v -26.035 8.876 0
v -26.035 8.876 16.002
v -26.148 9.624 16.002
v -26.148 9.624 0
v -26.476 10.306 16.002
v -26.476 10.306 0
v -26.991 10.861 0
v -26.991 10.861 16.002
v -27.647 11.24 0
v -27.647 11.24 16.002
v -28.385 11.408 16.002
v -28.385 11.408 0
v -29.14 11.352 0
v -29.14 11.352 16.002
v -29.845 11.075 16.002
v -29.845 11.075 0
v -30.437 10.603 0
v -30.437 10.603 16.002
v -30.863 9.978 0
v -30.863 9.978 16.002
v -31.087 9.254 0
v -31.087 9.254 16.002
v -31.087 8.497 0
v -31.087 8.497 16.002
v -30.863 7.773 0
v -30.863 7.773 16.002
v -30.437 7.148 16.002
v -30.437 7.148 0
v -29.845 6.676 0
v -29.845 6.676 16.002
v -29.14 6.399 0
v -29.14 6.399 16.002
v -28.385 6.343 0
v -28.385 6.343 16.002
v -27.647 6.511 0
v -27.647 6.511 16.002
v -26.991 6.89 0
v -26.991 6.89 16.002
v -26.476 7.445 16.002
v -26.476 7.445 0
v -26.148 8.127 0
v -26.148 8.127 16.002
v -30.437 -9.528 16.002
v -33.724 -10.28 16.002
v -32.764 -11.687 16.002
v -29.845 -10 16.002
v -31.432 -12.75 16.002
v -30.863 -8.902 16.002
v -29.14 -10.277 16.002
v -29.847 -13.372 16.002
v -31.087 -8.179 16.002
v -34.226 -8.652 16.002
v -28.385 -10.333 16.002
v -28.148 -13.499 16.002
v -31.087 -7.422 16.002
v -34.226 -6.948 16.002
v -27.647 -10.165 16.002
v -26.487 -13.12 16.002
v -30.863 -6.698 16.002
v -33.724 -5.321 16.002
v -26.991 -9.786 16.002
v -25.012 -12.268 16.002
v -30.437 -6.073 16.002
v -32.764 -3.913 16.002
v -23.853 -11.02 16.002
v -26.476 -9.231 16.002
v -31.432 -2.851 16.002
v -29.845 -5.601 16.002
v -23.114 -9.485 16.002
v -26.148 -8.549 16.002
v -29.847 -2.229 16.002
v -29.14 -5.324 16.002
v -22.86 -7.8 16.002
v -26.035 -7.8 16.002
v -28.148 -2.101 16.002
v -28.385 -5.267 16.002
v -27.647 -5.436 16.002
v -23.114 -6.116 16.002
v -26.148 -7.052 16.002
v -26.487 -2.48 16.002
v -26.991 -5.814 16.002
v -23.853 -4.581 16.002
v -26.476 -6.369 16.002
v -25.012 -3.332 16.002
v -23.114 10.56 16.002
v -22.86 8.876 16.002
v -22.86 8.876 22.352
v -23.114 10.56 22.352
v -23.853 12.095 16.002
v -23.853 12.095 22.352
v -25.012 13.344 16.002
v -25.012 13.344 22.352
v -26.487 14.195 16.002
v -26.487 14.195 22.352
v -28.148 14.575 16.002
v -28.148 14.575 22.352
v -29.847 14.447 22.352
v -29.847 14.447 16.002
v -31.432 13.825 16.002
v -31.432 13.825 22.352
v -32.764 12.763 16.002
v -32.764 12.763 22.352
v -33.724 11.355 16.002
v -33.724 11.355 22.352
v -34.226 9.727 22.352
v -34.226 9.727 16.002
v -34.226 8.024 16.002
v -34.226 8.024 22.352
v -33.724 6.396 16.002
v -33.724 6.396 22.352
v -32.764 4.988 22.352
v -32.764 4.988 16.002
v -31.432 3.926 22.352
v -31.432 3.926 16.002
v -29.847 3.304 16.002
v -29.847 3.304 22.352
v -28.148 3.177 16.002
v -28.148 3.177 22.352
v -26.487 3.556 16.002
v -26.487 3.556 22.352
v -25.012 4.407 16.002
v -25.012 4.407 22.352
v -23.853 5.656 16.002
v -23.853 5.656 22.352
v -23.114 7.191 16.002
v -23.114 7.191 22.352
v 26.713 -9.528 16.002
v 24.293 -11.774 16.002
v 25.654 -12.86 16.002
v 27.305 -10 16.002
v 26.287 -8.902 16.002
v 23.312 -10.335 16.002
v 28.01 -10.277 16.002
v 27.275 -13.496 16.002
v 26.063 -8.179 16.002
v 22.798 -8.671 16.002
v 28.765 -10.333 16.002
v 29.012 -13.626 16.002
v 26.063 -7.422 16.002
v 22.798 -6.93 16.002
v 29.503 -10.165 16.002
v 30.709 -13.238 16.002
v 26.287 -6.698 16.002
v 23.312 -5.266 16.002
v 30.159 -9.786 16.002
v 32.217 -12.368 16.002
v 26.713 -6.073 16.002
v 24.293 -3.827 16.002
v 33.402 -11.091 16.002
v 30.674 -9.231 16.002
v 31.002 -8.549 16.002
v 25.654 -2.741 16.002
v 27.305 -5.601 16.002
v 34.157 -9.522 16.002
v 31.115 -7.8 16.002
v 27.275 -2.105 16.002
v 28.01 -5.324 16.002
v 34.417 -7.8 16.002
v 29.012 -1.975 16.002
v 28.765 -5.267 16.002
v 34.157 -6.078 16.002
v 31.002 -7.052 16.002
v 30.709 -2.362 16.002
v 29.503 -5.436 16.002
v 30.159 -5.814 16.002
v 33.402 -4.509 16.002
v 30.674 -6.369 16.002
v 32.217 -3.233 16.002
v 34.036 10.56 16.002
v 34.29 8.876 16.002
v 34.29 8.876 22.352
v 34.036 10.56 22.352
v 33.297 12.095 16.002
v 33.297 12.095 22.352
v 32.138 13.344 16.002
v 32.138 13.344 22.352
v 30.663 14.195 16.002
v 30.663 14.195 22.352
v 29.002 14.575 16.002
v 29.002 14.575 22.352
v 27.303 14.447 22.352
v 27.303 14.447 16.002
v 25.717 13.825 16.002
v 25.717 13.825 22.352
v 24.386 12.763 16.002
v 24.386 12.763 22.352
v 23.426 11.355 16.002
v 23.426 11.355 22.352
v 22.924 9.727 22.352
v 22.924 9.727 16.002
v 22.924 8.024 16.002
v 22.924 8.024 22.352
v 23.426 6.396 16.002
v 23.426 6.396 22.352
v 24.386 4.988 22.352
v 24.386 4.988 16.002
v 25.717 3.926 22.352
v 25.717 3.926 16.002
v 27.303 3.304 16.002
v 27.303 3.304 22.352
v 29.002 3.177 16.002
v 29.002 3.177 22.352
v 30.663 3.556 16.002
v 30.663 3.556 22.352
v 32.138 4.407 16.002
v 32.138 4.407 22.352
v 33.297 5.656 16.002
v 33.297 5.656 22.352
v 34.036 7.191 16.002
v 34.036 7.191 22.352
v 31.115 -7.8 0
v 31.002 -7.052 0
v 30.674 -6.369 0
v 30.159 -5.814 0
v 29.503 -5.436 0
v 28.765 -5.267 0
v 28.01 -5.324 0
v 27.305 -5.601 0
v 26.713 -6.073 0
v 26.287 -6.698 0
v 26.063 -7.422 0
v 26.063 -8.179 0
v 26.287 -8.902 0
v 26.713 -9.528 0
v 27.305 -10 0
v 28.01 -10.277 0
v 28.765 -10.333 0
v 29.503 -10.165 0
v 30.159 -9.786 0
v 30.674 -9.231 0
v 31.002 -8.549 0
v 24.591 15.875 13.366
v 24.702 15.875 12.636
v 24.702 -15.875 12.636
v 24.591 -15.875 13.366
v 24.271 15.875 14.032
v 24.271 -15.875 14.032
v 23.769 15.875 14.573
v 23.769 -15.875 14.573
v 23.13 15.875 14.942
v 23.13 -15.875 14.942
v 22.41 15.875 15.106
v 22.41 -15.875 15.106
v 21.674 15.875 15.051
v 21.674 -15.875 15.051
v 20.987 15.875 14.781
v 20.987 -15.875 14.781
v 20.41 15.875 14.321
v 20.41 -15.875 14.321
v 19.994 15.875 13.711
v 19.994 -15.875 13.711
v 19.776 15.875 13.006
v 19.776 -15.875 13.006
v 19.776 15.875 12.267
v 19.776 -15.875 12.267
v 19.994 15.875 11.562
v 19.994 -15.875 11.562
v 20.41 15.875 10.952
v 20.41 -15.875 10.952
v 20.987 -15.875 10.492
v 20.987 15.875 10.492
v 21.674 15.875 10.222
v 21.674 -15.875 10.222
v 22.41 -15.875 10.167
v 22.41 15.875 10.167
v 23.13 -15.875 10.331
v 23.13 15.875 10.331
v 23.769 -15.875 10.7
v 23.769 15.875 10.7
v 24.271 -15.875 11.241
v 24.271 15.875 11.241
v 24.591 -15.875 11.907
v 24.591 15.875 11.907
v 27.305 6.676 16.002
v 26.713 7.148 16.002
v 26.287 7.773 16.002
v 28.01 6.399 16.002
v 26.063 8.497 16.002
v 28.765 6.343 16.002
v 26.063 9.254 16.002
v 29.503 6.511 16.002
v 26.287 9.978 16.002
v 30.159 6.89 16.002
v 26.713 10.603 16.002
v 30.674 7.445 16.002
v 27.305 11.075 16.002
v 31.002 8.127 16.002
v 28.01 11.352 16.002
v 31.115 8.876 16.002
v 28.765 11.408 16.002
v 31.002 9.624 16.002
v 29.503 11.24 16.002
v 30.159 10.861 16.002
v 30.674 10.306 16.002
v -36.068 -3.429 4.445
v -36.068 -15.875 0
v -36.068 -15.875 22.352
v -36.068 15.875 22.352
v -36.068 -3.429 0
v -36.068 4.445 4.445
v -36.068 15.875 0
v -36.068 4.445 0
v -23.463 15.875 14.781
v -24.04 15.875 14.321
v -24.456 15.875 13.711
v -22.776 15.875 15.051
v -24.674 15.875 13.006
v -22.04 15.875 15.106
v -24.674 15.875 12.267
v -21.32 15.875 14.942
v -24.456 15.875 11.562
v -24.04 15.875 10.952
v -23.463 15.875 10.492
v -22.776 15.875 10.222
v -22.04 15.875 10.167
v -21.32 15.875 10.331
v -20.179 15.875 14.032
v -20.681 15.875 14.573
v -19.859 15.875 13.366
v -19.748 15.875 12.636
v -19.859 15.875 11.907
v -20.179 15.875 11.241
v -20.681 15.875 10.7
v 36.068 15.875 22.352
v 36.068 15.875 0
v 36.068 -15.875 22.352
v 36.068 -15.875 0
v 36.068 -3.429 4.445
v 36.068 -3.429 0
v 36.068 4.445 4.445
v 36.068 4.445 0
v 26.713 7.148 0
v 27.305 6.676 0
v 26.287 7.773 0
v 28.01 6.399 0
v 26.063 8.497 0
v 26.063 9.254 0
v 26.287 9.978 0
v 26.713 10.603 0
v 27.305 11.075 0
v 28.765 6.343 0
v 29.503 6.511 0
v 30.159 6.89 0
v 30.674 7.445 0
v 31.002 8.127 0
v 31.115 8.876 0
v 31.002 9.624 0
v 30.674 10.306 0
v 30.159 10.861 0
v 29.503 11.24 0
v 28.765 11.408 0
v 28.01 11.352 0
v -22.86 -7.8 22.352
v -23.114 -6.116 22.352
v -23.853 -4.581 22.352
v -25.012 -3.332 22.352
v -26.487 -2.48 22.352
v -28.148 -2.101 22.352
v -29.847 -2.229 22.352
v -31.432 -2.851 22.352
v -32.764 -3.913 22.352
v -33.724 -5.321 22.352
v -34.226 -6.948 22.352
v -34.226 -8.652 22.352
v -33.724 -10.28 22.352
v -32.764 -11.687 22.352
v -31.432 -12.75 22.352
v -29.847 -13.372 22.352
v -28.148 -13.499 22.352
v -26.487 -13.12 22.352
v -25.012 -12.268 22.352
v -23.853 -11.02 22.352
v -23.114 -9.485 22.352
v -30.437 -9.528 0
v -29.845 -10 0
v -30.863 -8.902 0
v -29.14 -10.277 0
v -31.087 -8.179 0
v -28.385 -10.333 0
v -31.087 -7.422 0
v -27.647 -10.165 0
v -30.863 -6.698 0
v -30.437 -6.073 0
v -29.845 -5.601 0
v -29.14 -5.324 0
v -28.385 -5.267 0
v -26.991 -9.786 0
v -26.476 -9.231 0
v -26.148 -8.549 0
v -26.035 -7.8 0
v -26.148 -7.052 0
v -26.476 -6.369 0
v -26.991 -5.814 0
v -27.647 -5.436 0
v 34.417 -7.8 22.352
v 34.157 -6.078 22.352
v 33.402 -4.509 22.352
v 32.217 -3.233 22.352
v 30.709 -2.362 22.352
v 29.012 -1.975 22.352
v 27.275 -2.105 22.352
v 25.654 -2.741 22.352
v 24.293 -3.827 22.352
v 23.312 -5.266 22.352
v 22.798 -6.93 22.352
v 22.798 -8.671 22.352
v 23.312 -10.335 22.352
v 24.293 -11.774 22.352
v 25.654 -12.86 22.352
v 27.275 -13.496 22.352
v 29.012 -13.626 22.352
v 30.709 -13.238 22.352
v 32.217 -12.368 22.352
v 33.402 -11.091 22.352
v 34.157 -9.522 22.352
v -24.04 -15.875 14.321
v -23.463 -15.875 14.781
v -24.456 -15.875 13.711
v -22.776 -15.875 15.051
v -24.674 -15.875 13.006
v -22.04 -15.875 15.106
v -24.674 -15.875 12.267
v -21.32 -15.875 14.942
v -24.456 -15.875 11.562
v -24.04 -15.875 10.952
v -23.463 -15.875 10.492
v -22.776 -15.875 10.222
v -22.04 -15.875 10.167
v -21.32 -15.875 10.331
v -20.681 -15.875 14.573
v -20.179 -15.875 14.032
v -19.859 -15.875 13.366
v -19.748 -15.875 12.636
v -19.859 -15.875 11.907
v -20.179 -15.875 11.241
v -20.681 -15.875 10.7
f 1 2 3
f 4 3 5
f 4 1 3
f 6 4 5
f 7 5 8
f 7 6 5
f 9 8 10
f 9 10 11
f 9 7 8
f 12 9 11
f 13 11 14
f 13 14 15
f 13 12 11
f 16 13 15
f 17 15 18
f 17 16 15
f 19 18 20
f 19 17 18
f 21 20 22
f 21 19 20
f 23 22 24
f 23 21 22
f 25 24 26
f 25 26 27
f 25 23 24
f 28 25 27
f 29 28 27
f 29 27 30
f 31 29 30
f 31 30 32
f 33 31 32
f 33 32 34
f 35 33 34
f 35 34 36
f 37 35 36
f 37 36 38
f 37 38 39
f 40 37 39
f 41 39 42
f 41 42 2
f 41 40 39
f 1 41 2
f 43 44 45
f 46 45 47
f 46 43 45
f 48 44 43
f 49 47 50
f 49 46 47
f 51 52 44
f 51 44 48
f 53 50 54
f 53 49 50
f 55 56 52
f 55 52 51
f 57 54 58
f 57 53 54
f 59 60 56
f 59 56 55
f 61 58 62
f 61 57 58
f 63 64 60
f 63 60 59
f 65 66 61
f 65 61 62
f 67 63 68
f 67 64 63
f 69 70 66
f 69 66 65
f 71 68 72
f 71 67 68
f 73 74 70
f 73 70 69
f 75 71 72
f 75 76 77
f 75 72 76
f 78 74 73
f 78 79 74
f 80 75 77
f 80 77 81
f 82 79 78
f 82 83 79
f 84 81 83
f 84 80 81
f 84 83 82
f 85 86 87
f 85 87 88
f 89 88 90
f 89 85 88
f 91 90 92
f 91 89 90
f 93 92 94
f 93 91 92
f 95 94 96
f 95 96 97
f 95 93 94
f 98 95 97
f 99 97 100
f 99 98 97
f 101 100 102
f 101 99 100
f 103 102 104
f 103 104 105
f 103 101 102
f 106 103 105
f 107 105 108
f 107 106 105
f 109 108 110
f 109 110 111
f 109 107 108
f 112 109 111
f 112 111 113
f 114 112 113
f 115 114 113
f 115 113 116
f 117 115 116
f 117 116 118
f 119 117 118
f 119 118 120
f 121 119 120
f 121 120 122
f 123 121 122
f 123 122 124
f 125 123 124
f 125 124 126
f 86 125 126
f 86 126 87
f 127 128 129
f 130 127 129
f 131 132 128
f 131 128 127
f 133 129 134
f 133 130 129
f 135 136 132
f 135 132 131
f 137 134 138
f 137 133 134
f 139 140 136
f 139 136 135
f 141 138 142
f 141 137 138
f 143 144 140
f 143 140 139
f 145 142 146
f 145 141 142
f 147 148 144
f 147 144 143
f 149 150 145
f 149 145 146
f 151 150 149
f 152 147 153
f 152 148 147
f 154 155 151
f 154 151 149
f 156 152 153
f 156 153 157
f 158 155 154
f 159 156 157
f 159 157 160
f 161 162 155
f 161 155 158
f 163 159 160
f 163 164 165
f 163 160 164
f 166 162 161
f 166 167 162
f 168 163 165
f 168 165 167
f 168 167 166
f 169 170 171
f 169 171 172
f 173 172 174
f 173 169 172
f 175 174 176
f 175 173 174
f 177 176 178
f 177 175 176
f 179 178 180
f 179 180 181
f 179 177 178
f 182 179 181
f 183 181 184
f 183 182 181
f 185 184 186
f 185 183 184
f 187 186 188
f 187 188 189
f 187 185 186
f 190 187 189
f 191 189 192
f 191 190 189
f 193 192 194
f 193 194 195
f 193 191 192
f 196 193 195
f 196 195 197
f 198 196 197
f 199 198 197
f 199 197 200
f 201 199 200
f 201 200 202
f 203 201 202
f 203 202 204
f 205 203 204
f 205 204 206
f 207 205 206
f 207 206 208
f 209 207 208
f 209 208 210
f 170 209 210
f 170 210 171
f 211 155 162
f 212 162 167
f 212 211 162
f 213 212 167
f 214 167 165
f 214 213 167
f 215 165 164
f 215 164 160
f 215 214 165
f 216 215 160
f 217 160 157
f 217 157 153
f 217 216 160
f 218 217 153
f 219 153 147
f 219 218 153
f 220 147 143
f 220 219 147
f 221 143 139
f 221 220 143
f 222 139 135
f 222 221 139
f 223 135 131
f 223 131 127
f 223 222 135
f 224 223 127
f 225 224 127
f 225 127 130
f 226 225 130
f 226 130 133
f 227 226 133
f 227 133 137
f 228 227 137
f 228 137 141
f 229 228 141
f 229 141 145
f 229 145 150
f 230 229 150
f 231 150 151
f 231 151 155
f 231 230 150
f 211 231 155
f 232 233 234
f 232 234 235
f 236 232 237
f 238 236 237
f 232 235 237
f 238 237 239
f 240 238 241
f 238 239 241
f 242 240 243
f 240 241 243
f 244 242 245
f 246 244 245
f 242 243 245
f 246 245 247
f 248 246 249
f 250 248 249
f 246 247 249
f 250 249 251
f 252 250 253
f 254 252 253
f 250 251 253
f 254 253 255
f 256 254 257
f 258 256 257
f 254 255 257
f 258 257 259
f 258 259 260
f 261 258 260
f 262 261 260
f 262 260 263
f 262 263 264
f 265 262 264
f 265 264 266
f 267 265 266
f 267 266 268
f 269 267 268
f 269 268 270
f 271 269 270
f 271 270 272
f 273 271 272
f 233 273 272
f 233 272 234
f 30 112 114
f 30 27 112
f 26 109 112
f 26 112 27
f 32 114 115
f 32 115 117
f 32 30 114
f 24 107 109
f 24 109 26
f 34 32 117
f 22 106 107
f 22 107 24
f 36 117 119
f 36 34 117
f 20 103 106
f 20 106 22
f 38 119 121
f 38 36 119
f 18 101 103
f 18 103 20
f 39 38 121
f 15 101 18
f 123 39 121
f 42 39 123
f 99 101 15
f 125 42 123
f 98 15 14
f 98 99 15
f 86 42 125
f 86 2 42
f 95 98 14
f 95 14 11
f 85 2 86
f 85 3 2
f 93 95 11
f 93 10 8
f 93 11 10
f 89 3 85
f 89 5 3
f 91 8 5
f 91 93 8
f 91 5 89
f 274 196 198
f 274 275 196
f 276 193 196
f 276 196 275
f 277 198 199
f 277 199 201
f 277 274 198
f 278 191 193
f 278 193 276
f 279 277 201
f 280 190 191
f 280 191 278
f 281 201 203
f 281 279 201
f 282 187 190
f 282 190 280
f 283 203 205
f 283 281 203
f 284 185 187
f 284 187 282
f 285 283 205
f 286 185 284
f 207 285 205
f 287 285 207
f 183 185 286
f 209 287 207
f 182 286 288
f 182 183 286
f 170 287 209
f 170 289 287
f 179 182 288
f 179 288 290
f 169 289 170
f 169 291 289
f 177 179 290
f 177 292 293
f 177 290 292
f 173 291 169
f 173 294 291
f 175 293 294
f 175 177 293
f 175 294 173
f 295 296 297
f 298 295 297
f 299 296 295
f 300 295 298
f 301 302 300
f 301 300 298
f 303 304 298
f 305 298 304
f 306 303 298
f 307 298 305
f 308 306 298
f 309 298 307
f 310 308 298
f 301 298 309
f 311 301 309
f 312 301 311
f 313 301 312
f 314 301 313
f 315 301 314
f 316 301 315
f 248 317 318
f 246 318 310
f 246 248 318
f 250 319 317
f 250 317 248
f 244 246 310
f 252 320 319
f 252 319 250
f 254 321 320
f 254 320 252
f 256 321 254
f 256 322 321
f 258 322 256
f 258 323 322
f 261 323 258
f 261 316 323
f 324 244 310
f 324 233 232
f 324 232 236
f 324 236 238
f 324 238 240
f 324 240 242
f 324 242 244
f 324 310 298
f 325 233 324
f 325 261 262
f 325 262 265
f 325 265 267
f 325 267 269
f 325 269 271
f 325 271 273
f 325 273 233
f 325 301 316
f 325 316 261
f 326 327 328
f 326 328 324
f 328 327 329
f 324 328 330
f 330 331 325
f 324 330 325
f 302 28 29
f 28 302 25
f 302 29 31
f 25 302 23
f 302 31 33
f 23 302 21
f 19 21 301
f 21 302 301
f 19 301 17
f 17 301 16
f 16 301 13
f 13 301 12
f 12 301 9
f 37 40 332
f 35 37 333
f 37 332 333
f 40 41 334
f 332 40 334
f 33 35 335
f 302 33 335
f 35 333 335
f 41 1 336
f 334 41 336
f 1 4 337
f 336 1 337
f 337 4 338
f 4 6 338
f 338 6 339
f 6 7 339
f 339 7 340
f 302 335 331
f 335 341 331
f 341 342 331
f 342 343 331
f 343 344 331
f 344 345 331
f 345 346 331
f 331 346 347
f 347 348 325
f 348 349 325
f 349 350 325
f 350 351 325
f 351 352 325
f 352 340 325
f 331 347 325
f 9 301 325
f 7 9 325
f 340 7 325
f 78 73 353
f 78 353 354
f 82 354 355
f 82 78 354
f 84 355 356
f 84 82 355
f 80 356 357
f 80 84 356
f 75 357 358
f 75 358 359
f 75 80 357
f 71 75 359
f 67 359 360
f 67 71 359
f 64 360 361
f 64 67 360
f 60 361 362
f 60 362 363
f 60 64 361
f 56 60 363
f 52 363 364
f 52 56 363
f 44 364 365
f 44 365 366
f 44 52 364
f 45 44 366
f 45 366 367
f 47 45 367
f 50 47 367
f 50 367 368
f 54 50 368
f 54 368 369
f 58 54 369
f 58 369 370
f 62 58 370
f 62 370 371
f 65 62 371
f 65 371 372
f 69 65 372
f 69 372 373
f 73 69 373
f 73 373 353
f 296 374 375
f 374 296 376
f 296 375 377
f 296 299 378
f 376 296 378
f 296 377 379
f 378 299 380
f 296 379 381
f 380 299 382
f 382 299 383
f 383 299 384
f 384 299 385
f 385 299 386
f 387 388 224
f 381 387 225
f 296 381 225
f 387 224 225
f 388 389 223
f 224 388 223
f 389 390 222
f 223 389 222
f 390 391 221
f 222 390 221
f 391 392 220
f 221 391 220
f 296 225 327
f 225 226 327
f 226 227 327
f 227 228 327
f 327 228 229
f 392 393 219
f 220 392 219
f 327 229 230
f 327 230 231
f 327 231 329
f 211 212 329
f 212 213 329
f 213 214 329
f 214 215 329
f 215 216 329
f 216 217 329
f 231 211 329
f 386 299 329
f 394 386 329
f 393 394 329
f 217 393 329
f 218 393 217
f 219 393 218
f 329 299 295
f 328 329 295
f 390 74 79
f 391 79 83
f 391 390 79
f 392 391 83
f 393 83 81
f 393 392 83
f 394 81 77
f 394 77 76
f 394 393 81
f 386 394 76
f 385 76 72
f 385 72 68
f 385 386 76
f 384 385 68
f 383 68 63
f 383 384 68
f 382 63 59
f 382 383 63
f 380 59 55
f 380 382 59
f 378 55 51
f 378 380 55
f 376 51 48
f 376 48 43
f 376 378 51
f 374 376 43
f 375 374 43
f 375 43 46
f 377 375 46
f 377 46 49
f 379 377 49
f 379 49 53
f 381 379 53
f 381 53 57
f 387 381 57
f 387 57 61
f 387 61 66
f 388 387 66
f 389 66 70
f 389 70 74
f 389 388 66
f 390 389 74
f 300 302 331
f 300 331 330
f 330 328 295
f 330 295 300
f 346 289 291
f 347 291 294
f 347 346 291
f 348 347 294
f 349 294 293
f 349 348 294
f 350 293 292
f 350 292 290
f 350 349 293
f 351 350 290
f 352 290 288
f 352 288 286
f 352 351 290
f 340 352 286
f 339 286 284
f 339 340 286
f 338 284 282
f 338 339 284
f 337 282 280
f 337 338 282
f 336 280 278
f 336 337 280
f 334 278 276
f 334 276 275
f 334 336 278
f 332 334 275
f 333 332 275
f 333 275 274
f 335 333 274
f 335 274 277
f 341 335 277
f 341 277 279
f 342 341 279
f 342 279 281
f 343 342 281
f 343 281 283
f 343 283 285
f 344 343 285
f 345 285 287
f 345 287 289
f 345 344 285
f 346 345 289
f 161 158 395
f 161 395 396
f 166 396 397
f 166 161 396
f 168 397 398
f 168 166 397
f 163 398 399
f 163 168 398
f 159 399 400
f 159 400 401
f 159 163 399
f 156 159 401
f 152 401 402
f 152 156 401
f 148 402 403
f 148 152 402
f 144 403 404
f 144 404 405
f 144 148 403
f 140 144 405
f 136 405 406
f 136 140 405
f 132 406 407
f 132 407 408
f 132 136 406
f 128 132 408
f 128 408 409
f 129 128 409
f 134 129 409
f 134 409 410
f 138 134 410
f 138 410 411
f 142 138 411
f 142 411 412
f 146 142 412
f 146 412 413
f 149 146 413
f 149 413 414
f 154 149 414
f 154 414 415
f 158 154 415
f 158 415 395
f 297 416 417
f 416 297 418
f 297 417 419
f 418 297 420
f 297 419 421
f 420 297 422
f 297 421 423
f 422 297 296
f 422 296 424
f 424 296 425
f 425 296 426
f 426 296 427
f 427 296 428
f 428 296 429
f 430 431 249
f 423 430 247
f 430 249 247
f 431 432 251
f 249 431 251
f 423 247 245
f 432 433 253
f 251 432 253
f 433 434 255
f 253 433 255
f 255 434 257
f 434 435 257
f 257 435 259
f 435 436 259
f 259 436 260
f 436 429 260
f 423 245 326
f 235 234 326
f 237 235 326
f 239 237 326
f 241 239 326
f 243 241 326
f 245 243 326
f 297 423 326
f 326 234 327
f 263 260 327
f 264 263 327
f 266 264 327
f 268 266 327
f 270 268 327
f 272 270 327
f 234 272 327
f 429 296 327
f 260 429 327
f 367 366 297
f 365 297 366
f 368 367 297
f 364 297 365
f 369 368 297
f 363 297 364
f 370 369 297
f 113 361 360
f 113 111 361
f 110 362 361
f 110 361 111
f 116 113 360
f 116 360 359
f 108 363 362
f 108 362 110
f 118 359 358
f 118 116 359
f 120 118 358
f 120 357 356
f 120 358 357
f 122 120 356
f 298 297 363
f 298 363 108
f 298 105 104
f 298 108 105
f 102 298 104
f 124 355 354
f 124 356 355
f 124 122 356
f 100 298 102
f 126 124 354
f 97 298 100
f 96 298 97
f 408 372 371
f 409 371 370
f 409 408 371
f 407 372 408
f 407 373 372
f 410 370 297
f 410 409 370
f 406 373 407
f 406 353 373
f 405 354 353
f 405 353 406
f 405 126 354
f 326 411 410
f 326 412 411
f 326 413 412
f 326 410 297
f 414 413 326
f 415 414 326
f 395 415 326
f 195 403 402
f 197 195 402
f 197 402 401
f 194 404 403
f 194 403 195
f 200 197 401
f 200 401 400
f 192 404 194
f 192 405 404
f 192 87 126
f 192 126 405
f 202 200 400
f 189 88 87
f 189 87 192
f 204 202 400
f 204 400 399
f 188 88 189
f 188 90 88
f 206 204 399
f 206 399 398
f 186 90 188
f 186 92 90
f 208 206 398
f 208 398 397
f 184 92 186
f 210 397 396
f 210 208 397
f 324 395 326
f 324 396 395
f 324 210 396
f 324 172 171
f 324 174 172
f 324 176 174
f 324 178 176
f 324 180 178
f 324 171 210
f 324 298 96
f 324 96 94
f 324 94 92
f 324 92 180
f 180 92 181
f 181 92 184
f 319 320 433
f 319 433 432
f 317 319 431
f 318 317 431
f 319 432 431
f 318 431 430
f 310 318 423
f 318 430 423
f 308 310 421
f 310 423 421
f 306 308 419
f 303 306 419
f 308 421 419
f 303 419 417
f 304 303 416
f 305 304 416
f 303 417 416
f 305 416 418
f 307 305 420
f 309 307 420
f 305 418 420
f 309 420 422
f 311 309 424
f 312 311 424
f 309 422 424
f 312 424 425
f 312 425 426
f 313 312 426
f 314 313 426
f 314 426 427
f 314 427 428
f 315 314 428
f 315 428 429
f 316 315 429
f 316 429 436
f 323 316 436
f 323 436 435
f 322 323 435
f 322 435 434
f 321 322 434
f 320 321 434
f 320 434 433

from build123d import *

# Parameters (mm, degrees)
SKETCH1_W           = 72.136
SKETCH1_H           = 31.75
SKETCH1_R           = 5.715
SKETCH1_R_2         = 5.842
BOSS_EXTRUDE1_DEPTH = 22.352
SKETCH4_R           = 5.715
SKETCH4_R_2         = 2.54
SKETCH4_R_3         = 5.842
BOSS_EXTRUDE2_DEPTH = 16.002
SKETCH2_R           = 2.4765
CUT_EXTRUDE1_DEPTH  = 32.75
SKETCH5_W           = 4.445
SKETCH5_H           = 7.874
CUT_EXTRUDE2_DEPTH  = 73.136


with BuildPart() as part:
    # Sketch1 → Boss-Extrude1 (new body)
    with BuildSketch(Plane.XY):
        Rectangle(SKETCH1_W, SKETCH1_H)
        with Locations((-28.575, 8.875537672)):
            Circle(SKETCH1_R, mode=Mode.SUBTRACT)
        with Locations((28.575, 8.875537672)):
            Circle(SKETCH1_R, mode=Mode.SUBTRACT)
        with Locations((-28.575, -7.8002595)):
            Circle(SKETCH1_R, mode=Mode.SUBTRACT)
        with Locations((28.575, -7.8002595)):
            Circle(SKETCH1_R_2, mode=Mode.SUBTRACT)
    extrude(amount=BOSS_EXTRUDE1_DEPTH)

    # Sketch4 → Boss-Extrude2 (add)
    with BuildSketch(Plane.XY):
        with Locations((-28.575, 8.875537672)):
            Circle(SKETCH4_R)
        with Locations((-28.575, 8.875537672)):
            Circle(SKETCH4_R_2, mode=Mode.SUBTRACT)
        with Locations((-28.575, -7.8002595)):
            Circle(SKETCH4_R)
        with Locations((-28.575, -7.8002595)):
            Circle(SKETCH4_R_2, mode=Mode.SUBTRACT)
        with Locations((28.575, 8.875537672)):
            Circle(SKETCH4_R)
        with Locations((28.575, 8.875537672)):
            Circle(SKETCH4_R_2, mode=Mode.SUBTRACT)
        with Locations((28.575, -7.8002595)):
            Circle(SKETCH4_R_3)
        with Locations((28.575, -7.8002595)):
            Circle(SKETCH4_R_2, mode=Mode.SUBTRACT)
    extrude(amount=BOSS_EXTRUDE2_DEPTH)

    # Sketch2 → Cut-Extrude1 (cut, through all)
    with BuildSketch(Plane.XZ.offset(15.875)):
        with Locations((-22.225, 12.6365)):
            Circle(SKETCH2_R)
        with Locations((22.225, 12.6365)):
            Circle(SKETCH2_R)
    extrude(amount=-CUT_EXTRUDE1_DEPTH, mode=Mode.SUBTRACT)

    # Sketch5 → Cut-Extrude2 (cut, through all)
    with BuildSketch(Plane.ZY.offset(36.068)):
        with Locations((2.2225, 0.508)):
            Rectangle(SKETCH5_W, SKETCH5_H)
    extrude(amount=-CUT_EXTRUDE2_DEPTH, mode=Mode.SUBTRACT)


solid = part.part
